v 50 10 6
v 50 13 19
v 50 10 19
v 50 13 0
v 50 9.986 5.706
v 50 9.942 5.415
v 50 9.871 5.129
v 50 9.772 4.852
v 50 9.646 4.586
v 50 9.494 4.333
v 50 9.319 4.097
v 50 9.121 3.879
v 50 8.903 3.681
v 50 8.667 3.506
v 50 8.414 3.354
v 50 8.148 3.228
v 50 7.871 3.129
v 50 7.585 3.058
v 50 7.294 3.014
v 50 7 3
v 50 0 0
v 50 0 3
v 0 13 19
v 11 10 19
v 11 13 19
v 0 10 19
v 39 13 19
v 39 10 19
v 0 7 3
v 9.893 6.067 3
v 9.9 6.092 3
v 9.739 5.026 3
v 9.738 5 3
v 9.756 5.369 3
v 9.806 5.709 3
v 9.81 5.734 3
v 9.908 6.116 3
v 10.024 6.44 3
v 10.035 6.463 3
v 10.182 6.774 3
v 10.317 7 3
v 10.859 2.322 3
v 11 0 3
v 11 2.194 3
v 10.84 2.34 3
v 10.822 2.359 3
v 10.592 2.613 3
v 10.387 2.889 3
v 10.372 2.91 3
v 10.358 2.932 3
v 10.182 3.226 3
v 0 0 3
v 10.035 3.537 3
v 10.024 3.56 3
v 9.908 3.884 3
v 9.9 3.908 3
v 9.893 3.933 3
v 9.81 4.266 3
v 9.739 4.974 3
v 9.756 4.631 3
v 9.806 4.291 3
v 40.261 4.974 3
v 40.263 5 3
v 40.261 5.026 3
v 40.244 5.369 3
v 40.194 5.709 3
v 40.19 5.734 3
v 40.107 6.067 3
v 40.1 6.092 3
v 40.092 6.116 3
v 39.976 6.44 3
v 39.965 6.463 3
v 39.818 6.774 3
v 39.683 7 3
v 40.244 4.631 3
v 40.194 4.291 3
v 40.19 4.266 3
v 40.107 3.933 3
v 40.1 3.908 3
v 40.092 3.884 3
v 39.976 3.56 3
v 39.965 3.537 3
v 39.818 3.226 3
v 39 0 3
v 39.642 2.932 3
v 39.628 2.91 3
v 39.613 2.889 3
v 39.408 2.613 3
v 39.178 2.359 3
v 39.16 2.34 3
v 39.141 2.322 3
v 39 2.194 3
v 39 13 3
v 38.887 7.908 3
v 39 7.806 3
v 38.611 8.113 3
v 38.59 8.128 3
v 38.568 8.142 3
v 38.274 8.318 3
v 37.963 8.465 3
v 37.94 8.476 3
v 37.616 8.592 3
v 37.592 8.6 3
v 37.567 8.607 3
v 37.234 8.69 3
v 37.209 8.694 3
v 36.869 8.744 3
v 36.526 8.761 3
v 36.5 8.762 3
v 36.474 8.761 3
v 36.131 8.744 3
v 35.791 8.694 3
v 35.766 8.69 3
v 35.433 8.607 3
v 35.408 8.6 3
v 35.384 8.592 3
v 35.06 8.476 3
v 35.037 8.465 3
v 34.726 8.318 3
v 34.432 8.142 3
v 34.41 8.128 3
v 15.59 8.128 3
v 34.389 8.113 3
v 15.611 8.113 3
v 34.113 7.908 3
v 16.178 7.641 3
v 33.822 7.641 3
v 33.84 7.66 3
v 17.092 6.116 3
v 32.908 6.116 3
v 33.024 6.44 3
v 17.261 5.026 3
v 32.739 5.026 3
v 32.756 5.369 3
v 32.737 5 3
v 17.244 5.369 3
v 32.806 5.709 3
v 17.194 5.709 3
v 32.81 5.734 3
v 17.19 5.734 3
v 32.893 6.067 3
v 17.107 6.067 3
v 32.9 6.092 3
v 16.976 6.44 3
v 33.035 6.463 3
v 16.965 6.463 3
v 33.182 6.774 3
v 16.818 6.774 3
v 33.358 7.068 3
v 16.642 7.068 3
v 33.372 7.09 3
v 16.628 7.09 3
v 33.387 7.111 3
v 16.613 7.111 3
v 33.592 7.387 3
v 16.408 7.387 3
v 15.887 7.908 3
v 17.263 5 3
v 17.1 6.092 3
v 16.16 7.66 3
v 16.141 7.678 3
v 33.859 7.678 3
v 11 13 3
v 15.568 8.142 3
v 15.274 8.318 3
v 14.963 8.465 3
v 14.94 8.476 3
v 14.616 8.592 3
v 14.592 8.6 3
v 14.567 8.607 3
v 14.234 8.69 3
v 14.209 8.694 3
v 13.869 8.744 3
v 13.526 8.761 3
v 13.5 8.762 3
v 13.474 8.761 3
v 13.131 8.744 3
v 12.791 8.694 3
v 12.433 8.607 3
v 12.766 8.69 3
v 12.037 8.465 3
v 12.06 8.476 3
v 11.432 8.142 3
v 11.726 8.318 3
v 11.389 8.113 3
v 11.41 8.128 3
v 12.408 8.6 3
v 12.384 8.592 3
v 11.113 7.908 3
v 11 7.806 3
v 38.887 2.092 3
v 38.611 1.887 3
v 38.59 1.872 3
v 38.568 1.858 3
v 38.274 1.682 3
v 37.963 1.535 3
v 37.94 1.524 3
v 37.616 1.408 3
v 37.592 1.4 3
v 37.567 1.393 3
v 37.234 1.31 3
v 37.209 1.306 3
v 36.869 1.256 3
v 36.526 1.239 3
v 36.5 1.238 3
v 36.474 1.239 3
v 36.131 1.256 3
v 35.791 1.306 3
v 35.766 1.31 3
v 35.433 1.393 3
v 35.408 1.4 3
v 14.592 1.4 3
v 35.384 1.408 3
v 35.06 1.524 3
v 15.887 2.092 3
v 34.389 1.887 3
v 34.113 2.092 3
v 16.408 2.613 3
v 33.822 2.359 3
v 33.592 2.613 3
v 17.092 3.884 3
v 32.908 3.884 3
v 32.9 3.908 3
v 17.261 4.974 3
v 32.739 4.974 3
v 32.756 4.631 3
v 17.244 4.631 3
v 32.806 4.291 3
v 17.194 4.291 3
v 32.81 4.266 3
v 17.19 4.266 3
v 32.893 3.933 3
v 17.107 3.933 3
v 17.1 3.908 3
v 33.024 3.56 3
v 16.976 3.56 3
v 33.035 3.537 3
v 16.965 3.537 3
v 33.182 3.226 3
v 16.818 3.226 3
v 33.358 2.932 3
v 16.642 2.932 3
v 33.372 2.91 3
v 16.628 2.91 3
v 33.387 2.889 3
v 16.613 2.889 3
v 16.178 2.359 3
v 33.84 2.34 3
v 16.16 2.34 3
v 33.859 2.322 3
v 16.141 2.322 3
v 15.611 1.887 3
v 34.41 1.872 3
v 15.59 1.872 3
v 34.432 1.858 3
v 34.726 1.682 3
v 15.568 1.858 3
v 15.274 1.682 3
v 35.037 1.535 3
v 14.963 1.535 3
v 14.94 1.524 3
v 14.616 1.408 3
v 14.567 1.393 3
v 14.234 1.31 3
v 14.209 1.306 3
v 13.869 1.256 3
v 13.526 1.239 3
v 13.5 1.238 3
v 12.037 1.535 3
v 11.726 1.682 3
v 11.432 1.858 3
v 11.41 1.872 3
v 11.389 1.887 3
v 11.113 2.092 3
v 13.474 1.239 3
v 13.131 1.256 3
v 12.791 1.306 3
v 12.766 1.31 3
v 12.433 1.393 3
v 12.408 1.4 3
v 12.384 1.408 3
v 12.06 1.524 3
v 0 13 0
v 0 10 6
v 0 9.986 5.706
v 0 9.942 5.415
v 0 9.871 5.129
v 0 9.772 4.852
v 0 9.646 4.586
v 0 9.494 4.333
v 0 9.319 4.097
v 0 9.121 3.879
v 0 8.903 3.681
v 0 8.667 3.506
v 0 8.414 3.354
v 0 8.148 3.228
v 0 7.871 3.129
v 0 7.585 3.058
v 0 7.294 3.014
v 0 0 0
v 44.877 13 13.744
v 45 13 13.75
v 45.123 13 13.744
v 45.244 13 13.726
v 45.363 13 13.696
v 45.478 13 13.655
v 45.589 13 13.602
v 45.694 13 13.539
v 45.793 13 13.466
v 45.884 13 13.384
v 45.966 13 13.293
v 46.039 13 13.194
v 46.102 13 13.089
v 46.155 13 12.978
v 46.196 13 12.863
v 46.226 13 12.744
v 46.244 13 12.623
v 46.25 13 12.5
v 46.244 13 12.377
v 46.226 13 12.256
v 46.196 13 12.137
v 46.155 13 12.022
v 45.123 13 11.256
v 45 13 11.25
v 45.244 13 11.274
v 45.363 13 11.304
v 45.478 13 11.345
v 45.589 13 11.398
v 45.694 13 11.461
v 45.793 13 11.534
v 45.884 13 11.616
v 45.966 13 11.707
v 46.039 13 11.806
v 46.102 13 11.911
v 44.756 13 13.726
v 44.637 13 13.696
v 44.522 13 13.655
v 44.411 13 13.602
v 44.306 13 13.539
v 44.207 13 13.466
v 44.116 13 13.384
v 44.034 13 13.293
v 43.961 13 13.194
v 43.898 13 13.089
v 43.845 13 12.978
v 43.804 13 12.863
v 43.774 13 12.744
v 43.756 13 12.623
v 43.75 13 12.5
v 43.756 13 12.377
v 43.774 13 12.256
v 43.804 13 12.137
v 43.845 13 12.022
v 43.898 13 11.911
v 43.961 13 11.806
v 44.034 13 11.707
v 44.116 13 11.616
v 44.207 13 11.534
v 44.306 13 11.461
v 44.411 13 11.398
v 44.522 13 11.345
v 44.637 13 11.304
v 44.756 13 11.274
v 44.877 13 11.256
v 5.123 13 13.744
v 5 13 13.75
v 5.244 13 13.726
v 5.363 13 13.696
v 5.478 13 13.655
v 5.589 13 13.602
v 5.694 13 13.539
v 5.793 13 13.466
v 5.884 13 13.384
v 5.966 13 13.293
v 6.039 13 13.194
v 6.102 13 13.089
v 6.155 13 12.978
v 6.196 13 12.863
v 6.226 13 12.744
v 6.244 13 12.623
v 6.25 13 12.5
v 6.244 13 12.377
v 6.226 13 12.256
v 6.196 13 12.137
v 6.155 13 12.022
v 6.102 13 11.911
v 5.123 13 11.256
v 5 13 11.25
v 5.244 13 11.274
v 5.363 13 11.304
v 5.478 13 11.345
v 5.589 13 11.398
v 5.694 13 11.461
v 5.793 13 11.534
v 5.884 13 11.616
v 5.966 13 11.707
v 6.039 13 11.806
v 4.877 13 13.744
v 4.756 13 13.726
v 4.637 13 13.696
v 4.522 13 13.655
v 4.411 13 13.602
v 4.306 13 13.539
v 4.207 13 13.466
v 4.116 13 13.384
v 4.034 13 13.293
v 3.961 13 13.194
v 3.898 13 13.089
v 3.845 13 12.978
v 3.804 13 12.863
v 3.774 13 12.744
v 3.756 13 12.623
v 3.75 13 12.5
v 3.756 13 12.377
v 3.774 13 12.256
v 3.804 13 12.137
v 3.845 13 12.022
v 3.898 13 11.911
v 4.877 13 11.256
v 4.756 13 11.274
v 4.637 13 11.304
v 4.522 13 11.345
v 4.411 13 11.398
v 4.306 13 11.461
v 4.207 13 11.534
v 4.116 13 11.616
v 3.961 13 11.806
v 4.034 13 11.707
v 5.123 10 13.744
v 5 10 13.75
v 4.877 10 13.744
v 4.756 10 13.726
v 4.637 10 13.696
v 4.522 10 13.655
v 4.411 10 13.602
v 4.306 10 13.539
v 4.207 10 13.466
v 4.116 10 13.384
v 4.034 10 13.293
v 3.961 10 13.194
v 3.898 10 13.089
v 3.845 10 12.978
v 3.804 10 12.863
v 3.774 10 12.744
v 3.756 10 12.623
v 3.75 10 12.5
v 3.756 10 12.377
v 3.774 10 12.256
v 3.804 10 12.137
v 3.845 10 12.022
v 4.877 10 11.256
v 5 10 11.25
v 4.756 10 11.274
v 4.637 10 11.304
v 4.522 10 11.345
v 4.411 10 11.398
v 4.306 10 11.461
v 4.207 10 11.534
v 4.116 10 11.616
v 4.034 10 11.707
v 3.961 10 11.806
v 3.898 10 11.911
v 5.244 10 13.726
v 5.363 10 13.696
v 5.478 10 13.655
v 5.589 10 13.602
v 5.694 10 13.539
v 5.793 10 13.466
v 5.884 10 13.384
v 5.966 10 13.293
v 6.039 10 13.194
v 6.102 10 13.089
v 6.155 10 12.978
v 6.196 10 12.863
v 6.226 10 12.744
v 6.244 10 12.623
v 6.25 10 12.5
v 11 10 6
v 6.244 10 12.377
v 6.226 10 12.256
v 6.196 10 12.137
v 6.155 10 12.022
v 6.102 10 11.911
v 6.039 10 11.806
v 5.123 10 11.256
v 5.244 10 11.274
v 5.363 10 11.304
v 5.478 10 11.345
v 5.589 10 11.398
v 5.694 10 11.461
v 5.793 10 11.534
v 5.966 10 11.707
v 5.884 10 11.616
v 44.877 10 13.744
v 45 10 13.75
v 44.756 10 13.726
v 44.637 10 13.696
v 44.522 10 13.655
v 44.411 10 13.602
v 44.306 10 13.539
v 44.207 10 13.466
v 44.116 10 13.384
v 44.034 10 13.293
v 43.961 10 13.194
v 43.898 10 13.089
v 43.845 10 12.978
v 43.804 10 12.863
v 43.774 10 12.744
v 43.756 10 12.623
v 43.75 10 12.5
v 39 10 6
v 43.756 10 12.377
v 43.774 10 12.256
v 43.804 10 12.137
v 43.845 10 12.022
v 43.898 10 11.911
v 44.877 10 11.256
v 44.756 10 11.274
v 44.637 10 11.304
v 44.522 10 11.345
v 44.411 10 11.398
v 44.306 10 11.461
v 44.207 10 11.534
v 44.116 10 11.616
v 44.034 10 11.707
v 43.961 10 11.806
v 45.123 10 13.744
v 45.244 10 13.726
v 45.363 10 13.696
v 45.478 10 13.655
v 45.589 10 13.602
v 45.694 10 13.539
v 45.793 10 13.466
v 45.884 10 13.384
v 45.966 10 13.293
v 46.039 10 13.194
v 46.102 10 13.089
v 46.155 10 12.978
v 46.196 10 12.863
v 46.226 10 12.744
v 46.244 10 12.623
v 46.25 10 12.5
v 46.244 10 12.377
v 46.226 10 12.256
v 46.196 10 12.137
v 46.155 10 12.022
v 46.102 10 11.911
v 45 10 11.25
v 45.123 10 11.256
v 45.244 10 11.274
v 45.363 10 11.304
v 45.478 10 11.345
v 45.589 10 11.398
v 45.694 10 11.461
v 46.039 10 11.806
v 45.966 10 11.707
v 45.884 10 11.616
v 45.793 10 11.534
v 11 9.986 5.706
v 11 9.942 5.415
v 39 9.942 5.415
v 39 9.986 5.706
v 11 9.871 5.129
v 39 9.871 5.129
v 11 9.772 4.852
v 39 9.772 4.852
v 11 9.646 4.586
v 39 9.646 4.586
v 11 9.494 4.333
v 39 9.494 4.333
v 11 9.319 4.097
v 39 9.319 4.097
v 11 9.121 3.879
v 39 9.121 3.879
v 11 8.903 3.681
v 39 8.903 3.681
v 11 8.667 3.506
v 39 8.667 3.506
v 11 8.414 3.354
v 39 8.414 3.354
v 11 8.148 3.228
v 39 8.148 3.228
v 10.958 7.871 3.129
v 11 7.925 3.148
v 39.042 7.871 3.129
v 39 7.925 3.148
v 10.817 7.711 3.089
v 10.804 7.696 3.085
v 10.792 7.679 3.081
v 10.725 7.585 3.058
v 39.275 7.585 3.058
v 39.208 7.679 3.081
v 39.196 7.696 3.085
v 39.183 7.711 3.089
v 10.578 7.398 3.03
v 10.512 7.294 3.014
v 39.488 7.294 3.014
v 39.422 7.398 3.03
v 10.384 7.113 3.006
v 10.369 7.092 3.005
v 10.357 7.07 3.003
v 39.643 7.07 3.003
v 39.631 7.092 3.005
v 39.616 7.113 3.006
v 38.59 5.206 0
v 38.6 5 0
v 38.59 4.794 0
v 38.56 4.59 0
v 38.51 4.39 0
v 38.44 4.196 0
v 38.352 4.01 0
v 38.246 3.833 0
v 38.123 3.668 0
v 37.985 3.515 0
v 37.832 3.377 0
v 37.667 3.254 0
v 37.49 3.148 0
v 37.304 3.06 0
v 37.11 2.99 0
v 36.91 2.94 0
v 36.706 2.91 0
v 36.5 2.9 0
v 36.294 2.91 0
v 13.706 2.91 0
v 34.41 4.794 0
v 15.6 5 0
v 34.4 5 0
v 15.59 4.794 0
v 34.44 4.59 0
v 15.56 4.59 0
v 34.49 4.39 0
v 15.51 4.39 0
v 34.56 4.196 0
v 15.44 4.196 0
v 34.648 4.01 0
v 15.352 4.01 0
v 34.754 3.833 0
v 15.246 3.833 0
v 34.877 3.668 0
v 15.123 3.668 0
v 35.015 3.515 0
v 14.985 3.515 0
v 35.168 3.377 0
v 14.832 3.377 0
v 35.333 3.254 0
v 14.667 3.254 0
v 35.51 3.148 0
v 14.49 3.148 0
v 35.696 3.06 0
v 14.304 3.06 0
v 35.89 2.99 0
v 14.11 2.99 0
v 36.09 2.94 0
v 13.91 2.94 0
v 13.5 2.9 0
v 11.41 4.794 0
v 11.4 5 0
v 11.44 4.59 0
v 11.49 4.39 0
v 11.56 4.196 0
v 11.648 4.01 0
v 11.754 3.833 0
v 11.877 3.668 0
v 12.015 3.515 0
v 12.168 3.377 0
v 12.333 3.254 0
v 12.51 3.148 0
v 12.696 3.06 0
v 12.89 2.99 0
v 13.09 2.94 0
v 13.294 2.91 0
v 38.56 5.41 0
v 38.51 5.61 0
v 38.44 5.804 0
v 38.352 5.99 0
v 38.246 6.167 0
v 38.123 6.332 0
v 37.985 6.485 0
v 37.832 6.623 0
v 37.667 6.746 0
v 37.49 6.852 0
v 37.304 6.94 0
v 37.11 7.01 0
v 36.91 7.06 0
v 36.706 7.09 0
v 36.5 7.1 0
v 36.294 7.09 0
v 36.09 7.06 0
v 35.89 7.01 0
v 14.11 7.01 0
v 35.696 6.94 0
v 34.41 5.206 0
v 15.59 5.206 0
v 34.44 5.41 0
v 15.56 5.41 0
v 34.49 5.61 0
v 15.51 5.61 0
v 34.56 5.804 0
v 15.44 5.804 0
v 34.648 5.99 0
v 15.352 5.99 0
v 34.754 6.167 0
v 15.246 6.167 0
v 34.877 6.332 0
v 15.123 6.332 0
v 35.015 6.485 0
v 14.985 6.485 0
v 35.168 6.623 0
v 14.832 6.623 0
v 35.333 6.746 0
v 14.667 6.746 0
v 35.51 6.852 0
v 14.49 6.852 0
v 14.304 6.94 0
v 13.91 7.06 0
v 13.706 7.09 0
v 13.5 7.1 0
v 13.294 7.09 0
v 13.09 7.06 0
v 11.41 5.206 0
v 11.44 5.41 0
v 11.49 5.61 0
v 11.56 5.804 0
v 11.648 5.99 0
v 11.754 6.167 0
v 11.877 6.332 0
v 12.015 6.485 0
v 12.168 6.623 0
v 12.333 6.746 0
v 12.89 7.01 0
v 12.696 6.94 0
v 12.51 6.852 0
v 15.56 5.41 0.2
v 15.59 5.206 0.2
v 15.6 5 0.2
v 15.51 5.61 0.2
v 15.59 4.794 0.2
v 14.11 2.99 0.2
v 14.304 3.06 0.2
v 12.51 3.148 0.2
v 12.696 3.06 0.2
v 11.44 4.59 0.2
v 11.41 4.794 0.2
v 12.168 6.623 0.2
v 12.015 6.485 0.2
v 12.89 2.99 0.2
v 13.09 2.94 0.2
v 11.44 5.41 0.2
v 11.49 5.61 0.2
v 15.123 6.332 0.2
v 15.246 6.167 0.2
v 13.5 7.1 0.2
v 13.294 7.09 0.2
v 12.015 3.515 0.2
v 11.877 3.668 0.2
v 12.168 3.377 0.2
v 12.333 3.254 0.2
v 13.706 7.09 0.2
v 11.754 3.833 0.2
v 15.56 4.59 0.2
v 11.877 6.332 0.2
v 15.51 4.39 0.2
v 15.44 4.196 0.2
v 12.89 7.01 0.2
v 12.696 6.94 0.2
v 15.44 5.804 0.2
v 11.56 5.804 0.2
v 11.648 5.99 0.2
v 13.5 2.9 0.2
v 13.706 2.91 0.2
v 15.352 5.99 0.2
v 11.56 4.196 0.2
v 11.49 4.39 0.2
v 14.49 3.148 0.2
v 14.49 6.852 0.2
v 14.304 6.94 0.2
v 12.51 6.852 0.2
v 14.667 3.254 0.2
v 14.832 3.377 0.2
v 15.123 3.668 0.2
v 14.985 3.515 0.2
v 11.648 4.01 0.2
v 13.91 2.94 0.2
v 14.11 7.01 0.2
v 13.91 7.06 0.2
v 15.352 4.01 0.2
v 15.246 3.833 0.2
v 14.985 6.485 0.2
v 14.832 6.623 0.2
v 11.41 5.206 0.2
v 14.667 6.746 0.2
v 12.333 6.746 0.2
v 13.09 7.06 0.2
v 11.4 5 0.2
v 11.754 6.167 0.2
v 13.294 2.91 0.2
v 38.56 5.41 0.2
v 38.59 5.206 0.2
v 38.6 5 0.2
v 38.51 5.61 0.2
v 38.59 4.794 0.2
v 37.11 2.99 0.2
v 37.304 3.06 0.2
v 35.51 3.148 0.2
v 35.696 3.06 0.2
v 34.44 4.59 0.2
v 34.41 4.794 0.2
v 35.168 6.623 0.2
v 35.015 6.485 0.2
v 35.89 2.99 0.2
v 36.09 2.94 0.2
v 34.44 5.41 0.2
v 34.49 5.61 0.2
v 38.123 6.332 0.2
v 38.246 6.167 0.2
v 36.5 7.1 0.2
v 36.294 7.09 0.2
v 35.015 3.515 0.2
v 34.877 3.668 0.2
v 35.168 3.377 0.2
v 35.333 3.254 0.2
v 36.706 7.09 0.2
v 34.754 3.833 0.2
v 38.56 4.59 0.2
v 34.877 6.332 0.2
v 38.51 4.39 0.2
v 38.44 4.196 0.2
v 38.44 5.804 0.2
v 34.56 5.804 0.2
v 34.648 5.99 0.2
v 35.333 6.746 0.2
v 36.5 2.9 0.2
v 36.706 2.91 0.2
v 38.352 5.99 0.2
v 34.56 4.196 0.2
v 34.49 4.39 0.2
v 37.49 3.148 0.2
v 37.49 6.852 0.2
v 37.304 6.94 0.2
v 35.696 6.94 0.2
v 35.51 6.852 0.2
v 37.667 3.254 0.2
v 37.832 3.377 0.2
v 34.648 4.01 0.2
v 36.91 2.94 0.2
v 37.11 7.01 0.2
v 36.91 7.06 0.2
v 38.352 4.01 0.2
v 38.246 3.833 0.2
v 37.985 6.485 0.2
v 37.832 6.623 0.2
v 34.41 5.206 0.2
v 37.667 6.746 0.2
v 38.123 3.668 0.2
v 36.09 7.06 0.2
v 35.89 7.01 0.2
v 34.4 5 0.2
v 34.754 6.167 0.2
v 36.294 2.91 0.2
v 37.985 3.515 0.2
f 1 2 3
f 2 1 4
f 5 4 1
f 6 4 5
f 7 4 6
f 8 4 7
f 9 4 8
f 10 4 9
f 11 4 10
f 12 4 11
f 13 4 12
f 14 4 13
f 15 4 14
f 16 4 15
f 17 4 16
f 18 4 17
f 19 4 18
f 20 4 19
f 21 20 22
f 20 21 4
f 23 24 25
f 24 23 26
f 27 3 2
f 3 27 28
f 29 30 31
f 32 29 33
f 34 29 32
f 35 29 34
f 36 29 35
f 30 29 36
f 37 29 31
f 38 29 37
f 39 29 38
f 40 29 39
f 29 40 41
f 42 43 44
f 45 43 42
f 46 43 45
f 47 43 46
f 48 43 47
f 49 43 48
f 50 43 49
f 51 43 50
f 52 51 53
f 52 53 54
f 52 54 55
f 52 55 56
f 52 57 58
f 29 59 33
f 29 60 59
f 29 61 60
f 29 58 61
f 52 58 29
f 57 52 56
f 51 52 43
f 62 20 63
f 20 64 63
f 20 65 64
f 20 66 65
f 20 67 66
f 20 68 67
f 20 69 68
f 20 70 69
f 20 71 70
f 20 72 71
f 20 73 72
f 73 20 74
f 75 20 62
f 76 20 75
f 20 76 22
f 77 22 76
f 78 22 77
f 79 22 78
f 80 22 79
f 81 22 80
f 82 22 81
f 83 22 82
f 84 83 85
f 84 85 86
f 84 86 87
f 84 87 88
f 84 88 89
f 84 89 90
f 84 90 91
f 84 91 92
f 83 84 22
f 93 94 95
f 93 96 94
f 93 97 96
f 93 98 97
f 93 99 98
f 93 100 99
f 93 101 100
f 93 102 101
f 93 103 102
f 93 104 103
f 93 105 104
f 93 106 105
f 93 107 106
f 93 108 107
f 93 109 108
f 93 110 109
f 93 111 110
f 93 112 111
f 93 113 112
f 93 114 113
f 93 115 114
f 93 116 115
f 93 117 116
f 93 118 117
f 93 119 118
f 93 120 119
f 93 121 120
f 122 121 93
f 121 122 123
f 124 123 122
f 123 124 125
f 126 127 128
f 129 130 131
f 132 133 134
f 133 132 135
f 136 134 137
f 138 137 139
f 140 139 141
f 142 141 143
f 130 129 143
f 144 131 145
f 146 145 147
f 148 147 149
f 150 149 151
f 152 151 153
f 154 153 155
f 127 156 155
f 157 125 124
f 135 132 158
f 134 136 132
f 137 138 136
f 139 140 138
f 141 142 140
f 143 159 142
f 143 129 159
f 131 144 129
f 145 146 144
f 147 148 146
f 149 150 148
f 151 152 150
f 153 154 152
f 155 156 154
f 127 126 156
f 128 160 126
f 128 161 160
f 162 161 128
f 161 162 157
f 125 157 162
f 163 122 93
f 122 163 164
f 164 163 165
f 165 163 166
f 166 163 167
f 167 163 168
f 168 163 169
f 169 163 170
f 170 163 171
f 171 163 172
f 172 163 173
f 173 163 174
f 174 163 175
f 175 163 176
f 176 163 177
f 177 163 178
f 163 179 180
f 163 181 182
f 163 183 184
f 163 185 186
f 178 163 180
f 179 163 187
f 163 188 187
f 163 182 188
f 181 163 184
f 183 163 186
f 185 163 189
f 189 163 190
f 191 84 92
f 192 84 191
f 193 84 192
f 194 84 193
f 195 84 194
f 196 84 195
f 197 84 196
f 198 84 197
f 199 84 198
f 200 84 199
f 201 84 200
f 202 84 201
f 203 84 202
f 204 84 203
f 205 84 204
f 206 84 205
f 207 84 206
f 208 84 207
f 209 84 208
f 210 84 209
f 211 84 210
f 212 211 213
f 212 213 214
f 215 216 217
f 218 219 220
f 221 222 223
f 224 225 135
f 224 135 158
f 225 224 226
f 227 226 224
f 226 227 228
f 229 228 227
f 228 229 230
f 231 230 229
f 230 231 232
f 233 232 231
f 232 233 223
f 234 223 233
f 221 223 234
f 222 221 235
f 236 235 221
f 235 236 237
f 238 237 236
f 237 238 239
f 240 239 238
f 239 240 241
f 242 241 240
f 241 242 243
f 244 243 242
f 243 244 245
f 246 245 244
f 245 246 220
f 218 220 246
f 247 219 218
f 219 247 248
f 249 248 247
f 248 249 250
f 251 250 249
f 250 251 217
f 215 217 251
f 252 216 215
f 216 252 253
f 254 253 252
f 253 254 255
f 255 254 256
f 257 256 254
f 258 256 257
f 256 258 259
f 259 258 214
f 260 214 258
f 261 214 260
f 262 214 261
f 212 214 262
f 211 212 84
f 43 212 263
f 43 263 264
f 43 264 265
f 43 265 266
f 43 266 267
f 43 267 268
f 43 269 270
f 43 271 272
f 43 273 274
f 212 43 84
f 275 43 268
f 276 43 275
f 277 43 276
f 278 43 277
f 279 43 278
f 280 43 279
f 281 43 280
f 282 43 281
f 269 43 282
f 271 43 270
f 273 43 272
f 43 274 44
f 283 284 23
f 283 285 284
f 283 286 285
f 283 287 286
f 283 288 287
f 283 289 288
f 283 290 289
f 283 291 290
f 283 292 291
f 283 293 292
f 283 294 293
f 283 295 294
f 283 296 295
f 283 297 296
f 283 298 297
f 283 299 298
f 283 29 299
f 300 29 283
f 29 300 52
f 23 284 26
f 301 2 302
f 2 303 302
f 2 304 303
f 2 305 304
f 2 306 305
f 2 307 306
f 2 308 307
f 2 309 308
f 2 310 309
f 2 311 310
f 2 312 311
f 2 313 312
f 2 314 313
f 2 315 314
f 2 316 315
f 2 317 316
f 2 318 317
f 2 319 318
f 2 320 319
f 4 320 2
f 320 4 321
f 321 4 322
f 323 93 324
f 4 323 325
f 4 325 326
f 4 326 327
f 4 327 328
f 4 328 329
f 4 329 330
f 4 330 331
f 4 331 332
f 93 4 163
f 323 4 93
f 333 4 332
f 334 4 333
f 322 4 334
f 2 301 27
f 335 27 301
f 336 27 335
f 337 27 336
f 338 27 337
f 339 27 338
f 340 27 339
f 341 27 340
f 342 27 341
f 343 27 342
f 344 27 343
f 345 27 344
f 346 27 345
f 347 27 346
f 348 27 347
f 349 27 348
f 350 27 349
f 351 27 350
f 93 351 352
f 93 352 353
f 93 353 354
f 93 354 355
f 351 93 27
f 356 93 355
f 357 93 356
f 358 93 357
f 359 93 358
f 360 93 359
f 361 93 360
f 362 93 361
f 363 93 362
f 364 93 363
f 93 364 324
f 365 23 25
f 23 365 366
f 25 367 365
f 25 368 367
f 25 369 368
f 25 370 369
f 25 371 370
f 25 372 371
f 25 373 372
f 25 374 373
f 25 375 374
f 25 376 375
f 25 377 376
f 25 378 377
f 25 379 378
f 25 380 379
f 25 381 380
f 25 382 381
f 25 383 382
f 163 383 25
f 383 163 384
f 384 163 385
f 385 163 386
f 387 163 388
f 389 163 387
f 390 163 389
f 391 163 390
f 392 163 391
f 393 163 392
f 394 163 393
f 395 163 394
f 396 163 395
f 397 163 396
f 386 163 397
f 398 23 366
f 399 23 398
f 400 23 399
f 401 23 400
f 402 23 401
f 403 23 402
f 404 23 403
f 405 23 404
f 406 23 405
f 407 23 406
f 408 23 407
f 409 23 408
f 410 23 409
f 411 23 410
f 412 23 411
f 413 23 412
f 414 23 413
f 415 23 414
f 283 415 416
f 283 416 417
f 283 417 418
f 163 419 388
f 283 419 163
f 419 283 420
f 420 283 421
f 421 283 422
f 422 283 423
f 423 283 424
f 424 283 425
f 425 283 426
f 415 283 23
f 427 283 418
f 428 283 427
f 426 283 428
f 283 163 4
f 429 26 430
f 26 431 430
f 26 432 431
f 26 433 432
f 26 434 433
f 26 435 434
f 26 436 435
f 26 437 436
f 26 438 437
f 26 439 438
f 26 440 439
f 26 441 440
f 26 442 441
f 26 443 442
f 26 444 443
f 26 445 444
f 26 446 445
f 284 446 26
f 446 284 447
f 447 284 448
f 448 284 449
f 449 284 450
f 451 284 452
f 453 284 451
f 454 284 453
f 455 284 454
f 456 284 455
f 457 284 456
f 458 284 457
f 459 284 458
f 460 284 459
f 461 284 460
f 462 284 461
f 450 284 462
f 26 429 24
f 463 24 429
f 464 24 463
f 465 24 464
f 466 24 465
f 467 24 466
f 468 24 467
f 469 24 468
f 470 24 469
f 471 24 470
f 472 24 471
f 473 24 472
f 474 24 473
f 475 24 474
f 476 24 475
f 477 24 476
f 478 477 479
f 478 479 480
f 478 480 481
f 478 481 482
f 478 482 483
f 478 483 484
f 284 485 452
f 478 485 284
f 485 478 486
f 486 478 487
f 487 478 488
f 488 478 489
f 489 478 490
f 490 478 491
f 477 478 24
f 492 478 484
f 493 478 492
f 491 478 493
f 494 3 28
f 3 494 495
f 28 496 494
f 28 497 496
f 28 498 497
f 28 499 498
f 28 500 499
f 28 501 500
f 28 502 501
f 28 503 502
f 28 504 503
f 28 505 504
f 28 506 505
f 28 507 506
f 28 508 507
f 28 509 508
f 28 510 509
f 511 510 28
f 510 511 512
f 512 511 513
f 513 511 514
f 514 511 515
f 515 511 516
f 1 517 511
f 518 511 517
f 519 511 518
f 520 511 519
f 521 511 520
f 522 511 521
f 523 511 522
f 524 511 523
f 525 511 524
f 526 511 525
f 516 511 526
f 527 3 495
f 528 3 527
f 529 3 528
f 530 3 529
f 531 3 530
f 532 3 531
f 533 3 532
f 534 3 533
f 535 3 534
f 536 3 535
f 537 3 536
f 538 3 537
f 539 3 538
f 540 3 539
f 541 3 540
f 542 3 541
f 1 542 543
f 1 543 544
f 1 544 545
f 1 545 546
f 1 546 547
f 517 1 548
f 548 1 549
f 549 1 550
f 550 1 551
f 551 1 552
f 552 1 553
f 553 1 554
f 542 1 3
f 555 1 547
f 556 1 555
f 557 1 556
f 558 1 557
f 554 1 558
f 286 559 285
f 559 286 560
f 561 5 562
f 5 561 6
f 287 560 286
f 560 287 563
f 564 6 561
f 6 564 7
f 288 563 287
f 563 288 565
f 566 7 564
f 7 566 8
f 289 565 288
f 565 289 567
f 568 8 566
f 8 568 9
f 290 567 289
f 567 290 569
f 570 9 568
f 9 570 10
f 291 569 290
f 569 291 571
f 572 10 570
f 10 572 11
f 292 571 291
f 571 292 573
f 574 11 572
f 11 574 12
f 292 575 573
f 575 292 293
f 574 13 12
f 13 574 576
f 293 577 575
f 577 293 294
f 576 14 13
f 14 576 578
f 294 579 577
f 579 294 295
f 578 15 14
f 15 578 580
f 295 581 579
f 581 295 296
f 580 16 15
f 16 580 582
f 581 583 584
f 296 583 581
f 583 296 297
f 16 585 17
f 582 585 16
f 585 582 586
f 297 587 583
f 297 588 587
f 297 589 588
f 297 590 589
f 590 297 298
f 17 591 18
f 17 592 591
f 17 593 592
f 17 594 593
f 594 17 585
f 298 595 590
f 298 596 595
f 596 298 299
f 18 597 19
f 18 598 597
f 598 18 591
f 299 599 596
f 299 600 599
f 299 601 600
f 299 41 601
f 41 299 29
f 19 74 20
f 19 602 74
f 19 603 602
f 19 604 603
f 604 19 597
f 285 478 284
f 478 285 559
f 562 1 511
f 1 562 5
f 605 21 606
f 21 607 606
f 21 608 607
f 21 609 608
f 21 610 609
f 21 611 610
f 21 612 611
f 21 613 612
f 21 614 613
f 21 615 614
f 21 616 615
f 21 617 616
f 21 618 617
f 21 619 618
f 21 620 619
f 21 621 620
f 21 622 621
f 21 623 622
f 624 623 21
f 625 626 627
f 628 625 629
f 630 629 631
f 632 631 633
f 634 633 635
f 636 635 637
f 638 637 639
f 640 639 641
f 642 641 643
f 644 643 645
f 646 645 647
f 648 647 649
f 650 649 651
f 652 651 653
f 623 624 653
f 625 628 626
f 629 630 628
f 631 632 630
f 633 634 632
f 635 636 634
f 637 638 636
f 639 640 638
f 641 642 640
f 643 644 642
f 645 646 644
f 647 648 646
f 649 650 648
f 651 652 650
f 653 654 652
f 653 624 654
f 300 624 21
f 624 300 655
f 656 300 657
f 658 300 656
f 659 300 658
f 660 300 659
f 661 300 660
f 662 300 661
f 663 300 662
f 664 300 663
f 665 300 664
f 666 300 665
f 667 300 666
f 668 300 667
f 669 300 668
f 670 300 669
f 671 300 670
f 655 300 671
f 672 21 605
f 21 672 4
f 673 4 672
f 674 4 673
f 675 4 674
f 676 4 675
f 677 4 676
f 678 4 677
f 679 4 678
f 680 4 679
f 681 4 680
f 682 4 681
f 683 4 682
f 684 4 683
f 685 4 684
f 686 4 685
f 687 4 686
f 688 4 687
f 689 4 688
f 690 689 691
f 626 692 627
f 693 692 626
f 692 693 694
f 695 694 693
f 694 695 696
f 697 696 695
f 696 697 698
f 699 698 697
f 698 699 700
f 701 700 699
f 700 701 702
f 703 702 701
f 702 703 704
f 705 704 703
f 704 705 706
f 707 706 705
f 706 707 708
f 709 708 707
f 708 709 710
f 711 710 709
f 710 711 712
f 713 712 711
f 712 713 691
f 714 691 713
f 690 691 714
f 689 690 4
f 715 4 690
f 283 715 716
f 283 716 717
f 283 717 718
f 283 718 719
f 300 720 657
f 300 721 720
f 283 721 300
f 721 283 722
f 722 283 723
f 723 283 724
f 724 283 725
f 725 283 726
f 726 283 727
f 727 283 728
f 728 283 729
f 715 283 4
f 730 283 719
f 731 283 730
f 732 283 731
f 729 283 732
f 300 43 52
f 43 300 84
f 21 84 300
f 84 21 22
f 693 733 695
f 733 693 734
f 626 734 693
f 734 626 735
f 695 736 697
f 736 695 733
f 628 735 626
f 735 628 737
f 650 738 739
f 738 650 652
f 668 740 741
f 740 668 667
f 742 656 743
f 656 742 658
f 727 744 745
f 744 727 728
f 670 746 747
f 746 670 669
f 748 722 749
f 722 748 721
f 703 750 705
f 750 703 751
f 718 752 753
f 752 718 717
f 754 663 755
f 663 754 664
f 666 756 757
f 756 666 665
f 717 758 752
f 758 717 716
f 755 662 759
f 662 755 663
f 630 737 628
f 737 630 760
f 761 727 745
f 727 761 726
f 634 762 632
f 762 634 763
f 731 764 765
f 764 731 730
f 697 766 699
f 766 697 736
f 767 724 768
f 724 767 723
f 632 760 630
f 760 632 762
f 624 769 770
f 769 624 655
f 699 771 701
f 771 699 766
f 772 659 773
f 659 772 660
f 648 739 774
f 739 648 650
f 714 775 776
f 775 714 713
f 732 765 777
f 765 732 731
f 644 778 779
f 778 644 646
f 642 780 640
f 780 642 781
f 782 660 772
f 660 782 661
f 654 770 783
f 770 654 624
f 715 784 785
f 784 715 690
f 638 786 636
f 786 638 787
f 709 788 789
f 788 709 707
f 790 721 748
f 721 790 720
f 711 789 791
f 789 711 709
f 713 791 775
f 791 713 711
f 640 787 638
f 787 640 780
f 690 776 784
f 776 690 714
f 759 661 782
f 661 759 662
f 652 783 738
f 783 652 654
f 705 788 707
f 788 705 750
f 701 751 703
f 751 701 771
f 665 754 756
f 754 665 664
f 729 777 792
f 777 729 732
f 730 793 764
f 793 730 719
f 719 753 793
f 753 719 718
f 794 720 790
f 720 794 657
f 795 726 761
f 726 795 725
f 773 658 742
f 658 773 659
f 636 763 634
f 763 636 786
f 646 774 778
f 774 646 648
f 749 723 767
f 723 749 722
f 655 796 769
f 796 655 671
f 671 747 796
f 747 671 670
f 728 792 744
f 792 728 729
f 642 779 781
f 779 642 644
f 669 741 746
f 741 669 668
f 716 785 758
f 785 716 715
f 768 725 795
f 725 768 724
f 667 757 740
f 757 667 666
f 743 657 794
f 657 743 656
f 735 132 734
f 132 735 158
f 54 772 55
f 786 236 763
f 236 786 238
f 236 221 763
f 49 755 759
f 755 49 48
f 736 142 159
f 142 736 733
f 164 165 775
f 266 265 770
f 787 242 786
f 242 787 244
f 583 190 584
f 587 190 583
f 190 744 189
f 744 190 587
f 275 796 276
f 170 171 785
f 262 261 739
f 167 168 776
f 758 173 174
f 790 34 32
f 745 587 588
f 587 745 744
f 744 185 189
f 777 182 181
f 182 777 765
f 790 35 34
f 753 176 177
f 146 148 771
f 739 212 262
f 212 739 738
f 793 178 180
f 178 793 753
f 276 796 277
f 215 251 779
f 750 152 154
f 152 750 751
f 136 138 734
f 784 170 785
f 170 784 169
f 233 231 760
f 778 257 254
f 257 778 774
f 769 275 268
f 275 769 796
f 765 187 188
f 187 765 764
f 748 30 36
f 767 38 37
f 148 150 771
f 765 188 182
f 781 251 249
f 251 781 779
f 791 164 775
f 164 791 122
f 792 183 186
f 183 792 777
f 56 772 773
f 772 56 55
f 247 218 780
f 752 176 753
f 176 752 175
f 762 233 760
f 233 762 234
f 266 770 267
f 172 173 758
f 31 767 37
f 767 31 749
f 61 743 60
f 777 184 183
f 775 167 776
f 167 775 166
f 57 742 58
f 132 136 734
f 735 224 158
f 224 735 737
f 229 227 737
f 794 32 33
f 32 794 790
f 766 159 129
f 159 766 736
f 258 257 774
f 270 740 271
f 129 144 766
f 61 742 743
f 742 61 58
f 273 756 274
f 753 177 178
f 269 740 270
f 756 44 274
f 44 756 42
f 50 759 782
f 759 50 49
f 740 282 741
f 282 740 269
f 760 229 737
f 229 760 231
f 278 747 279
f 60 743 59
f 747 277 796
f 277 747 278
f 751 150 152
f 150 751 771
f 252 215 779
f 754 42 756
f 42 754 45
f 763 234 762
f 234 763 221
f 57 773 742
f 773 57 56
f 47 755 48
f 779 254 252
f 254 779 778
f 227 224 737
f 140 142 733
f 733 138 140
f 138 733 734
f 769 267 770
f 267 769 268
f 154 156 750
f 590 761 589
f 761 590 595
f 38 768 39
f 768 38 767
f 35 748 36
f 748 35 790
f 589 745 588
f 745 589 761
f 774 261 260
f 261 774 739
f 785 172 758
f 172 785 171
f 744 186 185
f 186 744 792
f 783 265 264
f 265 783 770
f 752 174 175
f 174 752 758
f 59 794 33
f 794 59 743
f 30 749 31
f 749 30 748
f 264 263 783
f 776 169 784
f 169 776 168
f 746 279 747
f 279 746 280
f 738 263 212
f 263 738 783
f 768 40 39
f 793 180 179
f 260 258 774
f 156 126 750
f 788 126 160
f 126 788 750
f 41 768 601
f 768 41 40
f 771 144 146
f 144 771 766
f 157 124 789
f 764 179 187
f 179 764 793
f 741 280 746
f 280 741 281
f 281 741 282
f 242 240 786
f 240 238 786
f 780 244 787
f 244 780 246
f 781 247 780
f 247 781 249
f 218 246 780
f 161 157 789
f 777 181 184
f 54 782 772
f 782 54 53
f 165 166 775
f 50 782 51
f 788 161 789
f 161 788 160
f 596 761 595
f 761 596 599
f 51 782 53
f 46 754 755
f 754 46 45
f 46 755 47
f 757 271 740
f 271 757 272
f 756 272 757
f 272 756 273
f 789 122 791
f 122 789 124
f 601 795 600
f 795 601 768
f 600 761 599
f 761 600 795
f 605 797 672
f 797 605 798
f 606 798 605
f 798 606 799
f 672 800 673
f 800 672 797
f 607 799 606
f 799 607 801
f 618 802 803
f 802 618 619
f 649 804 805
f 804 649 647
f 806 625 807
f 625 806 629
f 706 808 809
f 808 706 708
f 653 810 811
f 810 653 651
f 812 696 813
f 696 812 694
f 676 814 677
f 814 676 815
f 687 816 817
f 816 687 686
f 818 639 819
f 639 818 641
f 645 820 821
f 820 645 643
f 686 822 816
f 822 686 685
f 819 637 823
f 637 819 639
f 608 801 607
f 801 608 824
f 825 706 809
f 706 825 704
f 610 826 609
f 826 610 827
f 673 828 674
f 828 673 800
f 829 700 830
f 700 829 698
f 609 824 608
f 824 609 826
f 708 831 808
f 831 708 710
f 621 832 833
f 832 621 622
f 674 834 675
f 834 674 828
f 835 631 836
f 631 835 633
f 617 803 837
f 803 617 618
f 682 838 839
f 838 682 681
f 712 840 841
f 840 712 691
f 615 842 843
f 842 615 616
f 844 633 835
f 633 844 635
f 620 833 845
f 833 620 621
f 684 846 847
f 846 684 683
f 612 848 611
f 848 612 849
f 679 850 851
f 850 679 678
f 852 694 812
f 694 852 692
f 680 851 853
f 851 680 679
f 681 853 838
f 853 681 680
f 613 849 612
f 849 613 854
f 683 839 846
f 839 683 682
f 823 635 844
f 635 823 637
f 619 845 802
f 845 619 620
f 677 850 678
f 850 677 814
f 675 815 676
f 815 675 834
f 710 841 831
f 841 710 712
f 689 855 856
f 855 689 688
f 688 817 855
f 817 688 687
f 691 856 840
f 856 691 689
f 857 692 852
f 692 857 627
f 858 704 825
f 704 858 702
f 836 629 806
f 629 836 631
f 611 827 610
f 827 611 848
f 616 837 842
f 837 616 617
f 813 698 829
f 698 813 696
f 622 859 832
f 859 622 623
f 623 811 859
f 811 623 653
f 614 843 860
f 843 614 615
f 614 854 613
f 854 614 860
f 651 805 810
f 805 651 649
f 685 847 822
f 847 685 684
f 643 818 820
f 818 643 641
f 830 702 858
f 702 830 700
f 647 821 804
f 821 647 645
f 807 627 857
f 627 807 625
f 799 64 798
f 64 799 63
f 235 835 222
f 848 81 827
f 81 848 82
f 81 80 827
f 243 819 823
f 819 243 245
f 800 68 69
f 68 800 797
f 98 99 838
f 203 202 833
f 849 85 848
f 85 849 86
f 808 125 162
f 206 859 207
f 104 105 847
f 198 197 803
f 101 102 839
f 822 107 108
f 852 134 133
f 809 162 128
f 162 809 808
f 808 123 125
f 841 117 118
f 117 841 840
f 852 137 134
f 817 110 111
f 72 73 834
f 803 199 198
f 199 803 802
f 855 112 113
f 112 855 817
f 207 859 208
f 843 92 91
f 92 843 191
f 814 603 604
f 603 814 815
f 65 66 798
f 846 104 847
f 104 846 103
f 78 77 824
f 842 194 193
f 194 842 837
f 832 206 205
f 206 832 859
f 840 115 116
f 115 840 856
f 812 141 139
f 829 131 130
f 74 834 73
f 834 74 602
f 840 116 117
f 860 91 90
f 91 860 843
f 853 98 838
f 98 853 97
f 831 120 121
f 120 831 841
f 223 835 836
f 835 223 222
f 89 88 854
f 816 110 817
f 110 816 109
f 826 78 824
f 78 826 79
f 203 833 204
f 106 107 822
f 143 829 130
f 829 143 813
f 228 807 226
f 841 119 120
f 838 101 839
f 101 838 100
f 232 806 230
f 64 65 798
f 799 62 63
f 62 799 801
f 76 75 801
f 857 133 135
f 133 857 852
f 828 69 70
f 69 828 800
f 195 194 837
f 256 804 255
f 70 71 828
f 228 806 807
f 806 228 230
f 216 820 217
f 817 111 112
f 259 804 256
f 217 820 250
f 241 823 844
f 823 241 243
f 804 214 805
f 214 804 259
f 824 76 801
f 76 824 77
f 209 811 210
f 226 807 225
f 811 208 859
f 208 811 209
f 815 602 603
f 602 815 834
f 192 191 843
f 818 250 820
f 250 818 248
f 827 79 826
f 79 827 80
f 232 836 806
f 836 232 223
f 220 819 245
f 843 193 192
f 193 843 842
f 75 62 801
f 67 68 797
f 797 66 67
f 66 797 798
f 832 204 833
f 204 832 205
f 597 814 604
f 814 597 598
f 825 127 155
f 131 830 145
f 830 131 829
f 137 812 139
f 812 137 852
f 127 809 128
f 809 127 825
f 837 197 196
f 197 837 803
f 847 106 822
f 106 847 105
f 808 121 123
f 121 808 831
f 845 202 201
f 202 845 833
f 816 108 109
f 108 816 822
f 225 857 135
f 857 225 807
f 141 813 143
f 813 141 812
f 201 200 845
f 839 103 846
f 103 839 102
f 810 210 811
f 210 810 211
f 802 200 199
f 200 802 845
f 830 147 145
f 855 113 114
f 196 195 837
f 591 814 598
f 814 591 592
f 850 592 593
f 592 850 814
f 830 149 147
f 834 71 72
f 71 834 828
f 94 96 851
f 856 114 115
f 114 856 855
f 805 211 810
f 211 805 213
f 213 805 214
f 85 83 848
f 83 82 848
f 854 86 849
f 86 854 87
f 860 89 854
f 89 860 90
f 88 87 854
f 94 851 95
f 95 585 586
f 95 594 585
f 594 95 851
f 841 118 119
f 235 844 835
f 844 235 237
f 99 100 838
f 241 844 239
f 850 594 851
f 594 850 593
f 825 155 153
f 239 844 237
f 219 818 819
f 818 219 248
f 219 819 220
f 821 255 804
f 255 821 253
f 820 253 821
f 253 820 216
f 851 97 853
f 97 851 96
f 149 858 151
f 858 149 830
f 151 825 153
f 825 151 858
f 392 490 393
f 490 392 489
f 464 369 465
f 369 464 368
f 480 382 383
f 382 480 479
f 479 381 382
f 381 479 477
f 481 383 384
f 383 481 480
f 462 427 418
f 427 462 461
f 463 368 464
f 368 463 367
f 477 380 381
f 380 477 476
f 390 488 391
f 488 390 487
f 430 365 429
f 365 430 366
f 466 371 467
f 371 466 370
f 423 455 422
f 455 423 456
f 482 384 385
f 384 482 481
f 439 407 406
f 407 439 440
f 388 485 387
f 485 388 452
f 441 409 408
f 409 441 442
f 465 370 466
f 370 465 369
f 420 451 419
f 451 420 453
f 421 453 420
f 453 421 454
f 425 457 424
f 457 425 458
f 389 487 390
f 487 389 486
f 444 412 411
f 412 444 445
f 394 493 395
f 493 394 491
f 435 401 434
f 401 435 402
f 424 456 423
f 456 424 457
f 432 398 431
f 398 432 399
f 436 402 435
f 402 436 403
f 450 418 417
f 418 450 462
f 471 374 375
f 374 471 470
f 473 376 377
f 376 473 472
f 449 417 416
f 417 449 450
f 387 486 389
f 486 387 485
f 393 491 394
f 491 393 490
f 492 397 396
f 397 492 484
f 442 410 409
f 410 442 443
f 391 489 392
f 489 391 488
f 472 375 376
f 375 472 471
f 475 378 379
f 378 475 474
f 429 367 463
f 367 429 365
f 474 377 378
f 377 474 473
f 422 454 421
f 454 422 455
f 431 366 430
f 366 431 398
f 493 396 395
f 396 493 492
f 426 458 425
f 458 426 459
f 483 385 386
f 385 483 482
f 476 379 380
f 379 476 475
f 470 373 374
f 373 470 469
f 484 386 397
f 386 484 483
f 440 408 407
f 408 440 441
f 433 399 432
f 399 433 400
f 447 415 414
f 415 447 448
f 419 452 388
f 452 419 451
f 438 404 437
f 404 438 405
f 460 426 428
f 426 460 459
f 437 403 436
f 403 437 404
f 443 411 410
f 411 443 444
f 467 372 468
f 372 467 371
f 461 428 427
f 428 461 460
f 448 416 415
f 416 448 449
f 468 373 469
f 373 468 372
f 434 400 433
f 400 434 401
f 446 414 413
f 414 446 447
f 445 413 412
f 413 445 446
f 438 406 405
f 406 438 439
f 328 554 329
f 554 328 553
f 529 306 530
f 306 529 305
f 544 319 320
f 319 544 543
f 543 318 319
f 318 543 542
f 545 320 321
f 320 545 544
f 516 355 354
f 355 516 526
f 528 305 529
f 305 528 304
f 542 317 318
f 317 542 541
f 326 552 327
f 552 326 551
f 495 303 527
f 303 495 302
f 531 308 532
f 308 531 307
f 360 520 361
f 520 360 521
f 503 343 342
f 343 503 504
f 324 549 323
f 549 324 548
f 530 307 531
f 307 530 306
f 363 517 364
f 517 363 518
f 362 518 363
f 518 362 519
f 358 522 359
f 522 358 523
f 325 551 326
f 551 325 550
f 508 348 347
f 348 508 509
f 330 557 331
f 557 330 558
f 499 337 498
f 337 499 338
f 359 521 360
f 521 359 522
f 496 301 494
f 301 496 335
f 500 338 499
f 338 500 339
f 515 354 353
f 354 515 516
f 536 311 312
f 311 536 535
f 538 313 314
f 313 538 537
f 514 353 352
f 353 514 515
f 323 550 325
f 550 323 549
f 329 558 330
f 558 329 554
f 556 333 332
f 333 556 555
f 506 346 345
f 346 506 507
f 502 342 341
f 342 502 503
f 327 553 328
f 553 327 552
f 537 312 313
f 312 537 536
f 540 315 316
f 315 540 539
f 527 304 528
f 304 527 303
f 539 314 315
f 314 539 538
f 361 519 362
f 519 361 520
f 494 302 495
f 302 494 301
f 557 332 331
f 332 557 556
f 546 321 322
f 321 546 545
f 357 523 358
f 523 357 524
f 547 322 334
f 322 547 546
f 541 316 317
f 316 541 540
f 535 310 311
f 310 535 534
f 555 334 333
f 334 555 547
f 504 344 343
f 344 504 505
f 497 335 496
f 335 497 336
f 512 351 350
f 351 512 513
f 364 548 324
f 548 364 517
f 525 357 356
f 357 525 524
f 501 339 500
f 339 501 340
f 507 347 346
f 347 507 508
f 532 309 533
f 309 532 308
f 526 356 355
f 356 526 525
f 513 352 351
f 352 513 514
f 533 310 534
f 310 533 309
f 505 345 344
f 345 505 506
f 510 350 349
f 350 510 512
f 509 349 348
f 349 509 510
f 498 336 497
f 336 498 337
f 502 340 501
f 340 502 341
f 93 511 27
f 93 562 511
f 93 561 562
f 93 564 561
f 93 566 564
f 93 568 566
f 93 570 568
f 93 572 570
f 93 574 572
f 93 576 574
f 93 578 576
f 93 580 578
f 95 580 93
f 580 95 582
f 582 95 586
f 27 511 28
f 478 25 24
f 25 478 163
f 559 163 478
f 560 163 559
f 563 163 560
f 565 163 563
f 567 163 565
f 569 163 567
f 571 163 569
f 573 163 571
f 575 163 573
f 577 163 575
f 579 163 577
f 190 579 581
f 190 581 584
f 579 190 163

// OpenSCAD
// file: fillets/fillets.scad
// 2d primitive for outside fillets.
module fil_2d_o(r, angle=90) {
  intersection() {
    circle(r=r);
    polygon([
      [0, 0],
      [0, r],
      [r * tan(angle/2), r],
      [r * sin(angle), r * cos(angle)]
    ]);
  }
}

// 2d primitive for inside fillets.
module fil_2d_i(r, angle=90) {
  translate([r, r, 0])
  difference() {
    polygon([
      [0, 0],
      [0, -r],
      [-r * tan(angle/2), -r],
      [-r * sin(angle), -r * cos(angle)]
    ]);
    circle(r=r);
  }
}

// 3d polar outside fillet.
module fil_polar_o(R, r, angle=90) {
  rotate_extrude(convexity=10) {
    translate([R, 0, 0]) {
      fil_2d_o(r, angle);
    }
  }
}

// 3d polar inside fillet.
module fil_polar_i(R, r, angle=90) {
  rotate_extrude(convexity=10) {
    translate([R, 0, 0]) {
      fil_2d_i(r, angle);
    }
  }
}

// 3d linear outside fillet.
module fil_linear_o(l, r, angle=90) {
  rotate([0, -90, 180]) {
    linear_extrude(height=l, center=false) {
      fil_2d_o(r, angle);
    }
  }
}

// 3d linear inside fillet.
module fil_linear_i(l, r, angle=90) {
  rotate([0, -90, 180]) {
    linear_extrude(height=l, center=false) {
      fil_2d_i(r, angle);
    }
  }
}
// main file
/**
 * Bracket to (possibly) temporarily mount a switch and power socket to the
 * PSU. May be kept or removed once I have decided where the PSU goes.
 **/
use <fillets/fillets.scad>
$fn=64;

module PowerSocketBracket() {
    t = 3;  // Thickness of all parts
    w = 50; // Base width
    d = 5+5+t; // Depth of base
    h = 16; // Height of mount uprights - on top of base
    sw = 28;    // Width of the socket between the mount uprights
    psu_mc = 23; // Distance between centers of PSU mounting holes

    M4hd1 = 8;   // Diameter of top of M4 sunken head screw
    M4hd2 = 4.2;   // Diameter of bottom (shaft side) of M4 sunken head screw
    M4hh = 2.7; // Height of M4 sunken screw head

    s_mc = 40;  // Centers of socket mount holes
    s_mh = 9.5; // Height of socket mount hole from base
    s_mhd = 2.5; // Diameter of socket mount hole - will get a thread cut

    difference() {
        union() {
            // The base
            cube([w, d, t]);
            // Mount upright
            translate([0, d-t, t]) {
                cube([w, t, h]);
                fil_linear_i(w, 3);
            }
        }
        // Cut out for socket
        translate([(w-sw)/2, 0, t])
            cube([sw, d+0.2, h+0.1]);
        // PSU screw holes
        for(x=[(w-psu_mc)/2, (w+psu_mc)/2])
            translate([x, (d-t)/2, -0.1]) {
                cylinder(d=M4hd2, h=t);
                translate([0, 0, t-M4hh])
                    cylinder(d1=M4hd2, d2=M4hd1, h=M4hh+0.5);
            }
        // Socket holes
        for(x=[(w-s_mc)/2, (w+s_mc)/2])
            translate([x, d-t-0.1, t+s_mh])
                rotate([-90, 0, 0])
                    cylinder(d=s_mhd, h=t+0.2);
    }
}


PowerSocketBracket();
